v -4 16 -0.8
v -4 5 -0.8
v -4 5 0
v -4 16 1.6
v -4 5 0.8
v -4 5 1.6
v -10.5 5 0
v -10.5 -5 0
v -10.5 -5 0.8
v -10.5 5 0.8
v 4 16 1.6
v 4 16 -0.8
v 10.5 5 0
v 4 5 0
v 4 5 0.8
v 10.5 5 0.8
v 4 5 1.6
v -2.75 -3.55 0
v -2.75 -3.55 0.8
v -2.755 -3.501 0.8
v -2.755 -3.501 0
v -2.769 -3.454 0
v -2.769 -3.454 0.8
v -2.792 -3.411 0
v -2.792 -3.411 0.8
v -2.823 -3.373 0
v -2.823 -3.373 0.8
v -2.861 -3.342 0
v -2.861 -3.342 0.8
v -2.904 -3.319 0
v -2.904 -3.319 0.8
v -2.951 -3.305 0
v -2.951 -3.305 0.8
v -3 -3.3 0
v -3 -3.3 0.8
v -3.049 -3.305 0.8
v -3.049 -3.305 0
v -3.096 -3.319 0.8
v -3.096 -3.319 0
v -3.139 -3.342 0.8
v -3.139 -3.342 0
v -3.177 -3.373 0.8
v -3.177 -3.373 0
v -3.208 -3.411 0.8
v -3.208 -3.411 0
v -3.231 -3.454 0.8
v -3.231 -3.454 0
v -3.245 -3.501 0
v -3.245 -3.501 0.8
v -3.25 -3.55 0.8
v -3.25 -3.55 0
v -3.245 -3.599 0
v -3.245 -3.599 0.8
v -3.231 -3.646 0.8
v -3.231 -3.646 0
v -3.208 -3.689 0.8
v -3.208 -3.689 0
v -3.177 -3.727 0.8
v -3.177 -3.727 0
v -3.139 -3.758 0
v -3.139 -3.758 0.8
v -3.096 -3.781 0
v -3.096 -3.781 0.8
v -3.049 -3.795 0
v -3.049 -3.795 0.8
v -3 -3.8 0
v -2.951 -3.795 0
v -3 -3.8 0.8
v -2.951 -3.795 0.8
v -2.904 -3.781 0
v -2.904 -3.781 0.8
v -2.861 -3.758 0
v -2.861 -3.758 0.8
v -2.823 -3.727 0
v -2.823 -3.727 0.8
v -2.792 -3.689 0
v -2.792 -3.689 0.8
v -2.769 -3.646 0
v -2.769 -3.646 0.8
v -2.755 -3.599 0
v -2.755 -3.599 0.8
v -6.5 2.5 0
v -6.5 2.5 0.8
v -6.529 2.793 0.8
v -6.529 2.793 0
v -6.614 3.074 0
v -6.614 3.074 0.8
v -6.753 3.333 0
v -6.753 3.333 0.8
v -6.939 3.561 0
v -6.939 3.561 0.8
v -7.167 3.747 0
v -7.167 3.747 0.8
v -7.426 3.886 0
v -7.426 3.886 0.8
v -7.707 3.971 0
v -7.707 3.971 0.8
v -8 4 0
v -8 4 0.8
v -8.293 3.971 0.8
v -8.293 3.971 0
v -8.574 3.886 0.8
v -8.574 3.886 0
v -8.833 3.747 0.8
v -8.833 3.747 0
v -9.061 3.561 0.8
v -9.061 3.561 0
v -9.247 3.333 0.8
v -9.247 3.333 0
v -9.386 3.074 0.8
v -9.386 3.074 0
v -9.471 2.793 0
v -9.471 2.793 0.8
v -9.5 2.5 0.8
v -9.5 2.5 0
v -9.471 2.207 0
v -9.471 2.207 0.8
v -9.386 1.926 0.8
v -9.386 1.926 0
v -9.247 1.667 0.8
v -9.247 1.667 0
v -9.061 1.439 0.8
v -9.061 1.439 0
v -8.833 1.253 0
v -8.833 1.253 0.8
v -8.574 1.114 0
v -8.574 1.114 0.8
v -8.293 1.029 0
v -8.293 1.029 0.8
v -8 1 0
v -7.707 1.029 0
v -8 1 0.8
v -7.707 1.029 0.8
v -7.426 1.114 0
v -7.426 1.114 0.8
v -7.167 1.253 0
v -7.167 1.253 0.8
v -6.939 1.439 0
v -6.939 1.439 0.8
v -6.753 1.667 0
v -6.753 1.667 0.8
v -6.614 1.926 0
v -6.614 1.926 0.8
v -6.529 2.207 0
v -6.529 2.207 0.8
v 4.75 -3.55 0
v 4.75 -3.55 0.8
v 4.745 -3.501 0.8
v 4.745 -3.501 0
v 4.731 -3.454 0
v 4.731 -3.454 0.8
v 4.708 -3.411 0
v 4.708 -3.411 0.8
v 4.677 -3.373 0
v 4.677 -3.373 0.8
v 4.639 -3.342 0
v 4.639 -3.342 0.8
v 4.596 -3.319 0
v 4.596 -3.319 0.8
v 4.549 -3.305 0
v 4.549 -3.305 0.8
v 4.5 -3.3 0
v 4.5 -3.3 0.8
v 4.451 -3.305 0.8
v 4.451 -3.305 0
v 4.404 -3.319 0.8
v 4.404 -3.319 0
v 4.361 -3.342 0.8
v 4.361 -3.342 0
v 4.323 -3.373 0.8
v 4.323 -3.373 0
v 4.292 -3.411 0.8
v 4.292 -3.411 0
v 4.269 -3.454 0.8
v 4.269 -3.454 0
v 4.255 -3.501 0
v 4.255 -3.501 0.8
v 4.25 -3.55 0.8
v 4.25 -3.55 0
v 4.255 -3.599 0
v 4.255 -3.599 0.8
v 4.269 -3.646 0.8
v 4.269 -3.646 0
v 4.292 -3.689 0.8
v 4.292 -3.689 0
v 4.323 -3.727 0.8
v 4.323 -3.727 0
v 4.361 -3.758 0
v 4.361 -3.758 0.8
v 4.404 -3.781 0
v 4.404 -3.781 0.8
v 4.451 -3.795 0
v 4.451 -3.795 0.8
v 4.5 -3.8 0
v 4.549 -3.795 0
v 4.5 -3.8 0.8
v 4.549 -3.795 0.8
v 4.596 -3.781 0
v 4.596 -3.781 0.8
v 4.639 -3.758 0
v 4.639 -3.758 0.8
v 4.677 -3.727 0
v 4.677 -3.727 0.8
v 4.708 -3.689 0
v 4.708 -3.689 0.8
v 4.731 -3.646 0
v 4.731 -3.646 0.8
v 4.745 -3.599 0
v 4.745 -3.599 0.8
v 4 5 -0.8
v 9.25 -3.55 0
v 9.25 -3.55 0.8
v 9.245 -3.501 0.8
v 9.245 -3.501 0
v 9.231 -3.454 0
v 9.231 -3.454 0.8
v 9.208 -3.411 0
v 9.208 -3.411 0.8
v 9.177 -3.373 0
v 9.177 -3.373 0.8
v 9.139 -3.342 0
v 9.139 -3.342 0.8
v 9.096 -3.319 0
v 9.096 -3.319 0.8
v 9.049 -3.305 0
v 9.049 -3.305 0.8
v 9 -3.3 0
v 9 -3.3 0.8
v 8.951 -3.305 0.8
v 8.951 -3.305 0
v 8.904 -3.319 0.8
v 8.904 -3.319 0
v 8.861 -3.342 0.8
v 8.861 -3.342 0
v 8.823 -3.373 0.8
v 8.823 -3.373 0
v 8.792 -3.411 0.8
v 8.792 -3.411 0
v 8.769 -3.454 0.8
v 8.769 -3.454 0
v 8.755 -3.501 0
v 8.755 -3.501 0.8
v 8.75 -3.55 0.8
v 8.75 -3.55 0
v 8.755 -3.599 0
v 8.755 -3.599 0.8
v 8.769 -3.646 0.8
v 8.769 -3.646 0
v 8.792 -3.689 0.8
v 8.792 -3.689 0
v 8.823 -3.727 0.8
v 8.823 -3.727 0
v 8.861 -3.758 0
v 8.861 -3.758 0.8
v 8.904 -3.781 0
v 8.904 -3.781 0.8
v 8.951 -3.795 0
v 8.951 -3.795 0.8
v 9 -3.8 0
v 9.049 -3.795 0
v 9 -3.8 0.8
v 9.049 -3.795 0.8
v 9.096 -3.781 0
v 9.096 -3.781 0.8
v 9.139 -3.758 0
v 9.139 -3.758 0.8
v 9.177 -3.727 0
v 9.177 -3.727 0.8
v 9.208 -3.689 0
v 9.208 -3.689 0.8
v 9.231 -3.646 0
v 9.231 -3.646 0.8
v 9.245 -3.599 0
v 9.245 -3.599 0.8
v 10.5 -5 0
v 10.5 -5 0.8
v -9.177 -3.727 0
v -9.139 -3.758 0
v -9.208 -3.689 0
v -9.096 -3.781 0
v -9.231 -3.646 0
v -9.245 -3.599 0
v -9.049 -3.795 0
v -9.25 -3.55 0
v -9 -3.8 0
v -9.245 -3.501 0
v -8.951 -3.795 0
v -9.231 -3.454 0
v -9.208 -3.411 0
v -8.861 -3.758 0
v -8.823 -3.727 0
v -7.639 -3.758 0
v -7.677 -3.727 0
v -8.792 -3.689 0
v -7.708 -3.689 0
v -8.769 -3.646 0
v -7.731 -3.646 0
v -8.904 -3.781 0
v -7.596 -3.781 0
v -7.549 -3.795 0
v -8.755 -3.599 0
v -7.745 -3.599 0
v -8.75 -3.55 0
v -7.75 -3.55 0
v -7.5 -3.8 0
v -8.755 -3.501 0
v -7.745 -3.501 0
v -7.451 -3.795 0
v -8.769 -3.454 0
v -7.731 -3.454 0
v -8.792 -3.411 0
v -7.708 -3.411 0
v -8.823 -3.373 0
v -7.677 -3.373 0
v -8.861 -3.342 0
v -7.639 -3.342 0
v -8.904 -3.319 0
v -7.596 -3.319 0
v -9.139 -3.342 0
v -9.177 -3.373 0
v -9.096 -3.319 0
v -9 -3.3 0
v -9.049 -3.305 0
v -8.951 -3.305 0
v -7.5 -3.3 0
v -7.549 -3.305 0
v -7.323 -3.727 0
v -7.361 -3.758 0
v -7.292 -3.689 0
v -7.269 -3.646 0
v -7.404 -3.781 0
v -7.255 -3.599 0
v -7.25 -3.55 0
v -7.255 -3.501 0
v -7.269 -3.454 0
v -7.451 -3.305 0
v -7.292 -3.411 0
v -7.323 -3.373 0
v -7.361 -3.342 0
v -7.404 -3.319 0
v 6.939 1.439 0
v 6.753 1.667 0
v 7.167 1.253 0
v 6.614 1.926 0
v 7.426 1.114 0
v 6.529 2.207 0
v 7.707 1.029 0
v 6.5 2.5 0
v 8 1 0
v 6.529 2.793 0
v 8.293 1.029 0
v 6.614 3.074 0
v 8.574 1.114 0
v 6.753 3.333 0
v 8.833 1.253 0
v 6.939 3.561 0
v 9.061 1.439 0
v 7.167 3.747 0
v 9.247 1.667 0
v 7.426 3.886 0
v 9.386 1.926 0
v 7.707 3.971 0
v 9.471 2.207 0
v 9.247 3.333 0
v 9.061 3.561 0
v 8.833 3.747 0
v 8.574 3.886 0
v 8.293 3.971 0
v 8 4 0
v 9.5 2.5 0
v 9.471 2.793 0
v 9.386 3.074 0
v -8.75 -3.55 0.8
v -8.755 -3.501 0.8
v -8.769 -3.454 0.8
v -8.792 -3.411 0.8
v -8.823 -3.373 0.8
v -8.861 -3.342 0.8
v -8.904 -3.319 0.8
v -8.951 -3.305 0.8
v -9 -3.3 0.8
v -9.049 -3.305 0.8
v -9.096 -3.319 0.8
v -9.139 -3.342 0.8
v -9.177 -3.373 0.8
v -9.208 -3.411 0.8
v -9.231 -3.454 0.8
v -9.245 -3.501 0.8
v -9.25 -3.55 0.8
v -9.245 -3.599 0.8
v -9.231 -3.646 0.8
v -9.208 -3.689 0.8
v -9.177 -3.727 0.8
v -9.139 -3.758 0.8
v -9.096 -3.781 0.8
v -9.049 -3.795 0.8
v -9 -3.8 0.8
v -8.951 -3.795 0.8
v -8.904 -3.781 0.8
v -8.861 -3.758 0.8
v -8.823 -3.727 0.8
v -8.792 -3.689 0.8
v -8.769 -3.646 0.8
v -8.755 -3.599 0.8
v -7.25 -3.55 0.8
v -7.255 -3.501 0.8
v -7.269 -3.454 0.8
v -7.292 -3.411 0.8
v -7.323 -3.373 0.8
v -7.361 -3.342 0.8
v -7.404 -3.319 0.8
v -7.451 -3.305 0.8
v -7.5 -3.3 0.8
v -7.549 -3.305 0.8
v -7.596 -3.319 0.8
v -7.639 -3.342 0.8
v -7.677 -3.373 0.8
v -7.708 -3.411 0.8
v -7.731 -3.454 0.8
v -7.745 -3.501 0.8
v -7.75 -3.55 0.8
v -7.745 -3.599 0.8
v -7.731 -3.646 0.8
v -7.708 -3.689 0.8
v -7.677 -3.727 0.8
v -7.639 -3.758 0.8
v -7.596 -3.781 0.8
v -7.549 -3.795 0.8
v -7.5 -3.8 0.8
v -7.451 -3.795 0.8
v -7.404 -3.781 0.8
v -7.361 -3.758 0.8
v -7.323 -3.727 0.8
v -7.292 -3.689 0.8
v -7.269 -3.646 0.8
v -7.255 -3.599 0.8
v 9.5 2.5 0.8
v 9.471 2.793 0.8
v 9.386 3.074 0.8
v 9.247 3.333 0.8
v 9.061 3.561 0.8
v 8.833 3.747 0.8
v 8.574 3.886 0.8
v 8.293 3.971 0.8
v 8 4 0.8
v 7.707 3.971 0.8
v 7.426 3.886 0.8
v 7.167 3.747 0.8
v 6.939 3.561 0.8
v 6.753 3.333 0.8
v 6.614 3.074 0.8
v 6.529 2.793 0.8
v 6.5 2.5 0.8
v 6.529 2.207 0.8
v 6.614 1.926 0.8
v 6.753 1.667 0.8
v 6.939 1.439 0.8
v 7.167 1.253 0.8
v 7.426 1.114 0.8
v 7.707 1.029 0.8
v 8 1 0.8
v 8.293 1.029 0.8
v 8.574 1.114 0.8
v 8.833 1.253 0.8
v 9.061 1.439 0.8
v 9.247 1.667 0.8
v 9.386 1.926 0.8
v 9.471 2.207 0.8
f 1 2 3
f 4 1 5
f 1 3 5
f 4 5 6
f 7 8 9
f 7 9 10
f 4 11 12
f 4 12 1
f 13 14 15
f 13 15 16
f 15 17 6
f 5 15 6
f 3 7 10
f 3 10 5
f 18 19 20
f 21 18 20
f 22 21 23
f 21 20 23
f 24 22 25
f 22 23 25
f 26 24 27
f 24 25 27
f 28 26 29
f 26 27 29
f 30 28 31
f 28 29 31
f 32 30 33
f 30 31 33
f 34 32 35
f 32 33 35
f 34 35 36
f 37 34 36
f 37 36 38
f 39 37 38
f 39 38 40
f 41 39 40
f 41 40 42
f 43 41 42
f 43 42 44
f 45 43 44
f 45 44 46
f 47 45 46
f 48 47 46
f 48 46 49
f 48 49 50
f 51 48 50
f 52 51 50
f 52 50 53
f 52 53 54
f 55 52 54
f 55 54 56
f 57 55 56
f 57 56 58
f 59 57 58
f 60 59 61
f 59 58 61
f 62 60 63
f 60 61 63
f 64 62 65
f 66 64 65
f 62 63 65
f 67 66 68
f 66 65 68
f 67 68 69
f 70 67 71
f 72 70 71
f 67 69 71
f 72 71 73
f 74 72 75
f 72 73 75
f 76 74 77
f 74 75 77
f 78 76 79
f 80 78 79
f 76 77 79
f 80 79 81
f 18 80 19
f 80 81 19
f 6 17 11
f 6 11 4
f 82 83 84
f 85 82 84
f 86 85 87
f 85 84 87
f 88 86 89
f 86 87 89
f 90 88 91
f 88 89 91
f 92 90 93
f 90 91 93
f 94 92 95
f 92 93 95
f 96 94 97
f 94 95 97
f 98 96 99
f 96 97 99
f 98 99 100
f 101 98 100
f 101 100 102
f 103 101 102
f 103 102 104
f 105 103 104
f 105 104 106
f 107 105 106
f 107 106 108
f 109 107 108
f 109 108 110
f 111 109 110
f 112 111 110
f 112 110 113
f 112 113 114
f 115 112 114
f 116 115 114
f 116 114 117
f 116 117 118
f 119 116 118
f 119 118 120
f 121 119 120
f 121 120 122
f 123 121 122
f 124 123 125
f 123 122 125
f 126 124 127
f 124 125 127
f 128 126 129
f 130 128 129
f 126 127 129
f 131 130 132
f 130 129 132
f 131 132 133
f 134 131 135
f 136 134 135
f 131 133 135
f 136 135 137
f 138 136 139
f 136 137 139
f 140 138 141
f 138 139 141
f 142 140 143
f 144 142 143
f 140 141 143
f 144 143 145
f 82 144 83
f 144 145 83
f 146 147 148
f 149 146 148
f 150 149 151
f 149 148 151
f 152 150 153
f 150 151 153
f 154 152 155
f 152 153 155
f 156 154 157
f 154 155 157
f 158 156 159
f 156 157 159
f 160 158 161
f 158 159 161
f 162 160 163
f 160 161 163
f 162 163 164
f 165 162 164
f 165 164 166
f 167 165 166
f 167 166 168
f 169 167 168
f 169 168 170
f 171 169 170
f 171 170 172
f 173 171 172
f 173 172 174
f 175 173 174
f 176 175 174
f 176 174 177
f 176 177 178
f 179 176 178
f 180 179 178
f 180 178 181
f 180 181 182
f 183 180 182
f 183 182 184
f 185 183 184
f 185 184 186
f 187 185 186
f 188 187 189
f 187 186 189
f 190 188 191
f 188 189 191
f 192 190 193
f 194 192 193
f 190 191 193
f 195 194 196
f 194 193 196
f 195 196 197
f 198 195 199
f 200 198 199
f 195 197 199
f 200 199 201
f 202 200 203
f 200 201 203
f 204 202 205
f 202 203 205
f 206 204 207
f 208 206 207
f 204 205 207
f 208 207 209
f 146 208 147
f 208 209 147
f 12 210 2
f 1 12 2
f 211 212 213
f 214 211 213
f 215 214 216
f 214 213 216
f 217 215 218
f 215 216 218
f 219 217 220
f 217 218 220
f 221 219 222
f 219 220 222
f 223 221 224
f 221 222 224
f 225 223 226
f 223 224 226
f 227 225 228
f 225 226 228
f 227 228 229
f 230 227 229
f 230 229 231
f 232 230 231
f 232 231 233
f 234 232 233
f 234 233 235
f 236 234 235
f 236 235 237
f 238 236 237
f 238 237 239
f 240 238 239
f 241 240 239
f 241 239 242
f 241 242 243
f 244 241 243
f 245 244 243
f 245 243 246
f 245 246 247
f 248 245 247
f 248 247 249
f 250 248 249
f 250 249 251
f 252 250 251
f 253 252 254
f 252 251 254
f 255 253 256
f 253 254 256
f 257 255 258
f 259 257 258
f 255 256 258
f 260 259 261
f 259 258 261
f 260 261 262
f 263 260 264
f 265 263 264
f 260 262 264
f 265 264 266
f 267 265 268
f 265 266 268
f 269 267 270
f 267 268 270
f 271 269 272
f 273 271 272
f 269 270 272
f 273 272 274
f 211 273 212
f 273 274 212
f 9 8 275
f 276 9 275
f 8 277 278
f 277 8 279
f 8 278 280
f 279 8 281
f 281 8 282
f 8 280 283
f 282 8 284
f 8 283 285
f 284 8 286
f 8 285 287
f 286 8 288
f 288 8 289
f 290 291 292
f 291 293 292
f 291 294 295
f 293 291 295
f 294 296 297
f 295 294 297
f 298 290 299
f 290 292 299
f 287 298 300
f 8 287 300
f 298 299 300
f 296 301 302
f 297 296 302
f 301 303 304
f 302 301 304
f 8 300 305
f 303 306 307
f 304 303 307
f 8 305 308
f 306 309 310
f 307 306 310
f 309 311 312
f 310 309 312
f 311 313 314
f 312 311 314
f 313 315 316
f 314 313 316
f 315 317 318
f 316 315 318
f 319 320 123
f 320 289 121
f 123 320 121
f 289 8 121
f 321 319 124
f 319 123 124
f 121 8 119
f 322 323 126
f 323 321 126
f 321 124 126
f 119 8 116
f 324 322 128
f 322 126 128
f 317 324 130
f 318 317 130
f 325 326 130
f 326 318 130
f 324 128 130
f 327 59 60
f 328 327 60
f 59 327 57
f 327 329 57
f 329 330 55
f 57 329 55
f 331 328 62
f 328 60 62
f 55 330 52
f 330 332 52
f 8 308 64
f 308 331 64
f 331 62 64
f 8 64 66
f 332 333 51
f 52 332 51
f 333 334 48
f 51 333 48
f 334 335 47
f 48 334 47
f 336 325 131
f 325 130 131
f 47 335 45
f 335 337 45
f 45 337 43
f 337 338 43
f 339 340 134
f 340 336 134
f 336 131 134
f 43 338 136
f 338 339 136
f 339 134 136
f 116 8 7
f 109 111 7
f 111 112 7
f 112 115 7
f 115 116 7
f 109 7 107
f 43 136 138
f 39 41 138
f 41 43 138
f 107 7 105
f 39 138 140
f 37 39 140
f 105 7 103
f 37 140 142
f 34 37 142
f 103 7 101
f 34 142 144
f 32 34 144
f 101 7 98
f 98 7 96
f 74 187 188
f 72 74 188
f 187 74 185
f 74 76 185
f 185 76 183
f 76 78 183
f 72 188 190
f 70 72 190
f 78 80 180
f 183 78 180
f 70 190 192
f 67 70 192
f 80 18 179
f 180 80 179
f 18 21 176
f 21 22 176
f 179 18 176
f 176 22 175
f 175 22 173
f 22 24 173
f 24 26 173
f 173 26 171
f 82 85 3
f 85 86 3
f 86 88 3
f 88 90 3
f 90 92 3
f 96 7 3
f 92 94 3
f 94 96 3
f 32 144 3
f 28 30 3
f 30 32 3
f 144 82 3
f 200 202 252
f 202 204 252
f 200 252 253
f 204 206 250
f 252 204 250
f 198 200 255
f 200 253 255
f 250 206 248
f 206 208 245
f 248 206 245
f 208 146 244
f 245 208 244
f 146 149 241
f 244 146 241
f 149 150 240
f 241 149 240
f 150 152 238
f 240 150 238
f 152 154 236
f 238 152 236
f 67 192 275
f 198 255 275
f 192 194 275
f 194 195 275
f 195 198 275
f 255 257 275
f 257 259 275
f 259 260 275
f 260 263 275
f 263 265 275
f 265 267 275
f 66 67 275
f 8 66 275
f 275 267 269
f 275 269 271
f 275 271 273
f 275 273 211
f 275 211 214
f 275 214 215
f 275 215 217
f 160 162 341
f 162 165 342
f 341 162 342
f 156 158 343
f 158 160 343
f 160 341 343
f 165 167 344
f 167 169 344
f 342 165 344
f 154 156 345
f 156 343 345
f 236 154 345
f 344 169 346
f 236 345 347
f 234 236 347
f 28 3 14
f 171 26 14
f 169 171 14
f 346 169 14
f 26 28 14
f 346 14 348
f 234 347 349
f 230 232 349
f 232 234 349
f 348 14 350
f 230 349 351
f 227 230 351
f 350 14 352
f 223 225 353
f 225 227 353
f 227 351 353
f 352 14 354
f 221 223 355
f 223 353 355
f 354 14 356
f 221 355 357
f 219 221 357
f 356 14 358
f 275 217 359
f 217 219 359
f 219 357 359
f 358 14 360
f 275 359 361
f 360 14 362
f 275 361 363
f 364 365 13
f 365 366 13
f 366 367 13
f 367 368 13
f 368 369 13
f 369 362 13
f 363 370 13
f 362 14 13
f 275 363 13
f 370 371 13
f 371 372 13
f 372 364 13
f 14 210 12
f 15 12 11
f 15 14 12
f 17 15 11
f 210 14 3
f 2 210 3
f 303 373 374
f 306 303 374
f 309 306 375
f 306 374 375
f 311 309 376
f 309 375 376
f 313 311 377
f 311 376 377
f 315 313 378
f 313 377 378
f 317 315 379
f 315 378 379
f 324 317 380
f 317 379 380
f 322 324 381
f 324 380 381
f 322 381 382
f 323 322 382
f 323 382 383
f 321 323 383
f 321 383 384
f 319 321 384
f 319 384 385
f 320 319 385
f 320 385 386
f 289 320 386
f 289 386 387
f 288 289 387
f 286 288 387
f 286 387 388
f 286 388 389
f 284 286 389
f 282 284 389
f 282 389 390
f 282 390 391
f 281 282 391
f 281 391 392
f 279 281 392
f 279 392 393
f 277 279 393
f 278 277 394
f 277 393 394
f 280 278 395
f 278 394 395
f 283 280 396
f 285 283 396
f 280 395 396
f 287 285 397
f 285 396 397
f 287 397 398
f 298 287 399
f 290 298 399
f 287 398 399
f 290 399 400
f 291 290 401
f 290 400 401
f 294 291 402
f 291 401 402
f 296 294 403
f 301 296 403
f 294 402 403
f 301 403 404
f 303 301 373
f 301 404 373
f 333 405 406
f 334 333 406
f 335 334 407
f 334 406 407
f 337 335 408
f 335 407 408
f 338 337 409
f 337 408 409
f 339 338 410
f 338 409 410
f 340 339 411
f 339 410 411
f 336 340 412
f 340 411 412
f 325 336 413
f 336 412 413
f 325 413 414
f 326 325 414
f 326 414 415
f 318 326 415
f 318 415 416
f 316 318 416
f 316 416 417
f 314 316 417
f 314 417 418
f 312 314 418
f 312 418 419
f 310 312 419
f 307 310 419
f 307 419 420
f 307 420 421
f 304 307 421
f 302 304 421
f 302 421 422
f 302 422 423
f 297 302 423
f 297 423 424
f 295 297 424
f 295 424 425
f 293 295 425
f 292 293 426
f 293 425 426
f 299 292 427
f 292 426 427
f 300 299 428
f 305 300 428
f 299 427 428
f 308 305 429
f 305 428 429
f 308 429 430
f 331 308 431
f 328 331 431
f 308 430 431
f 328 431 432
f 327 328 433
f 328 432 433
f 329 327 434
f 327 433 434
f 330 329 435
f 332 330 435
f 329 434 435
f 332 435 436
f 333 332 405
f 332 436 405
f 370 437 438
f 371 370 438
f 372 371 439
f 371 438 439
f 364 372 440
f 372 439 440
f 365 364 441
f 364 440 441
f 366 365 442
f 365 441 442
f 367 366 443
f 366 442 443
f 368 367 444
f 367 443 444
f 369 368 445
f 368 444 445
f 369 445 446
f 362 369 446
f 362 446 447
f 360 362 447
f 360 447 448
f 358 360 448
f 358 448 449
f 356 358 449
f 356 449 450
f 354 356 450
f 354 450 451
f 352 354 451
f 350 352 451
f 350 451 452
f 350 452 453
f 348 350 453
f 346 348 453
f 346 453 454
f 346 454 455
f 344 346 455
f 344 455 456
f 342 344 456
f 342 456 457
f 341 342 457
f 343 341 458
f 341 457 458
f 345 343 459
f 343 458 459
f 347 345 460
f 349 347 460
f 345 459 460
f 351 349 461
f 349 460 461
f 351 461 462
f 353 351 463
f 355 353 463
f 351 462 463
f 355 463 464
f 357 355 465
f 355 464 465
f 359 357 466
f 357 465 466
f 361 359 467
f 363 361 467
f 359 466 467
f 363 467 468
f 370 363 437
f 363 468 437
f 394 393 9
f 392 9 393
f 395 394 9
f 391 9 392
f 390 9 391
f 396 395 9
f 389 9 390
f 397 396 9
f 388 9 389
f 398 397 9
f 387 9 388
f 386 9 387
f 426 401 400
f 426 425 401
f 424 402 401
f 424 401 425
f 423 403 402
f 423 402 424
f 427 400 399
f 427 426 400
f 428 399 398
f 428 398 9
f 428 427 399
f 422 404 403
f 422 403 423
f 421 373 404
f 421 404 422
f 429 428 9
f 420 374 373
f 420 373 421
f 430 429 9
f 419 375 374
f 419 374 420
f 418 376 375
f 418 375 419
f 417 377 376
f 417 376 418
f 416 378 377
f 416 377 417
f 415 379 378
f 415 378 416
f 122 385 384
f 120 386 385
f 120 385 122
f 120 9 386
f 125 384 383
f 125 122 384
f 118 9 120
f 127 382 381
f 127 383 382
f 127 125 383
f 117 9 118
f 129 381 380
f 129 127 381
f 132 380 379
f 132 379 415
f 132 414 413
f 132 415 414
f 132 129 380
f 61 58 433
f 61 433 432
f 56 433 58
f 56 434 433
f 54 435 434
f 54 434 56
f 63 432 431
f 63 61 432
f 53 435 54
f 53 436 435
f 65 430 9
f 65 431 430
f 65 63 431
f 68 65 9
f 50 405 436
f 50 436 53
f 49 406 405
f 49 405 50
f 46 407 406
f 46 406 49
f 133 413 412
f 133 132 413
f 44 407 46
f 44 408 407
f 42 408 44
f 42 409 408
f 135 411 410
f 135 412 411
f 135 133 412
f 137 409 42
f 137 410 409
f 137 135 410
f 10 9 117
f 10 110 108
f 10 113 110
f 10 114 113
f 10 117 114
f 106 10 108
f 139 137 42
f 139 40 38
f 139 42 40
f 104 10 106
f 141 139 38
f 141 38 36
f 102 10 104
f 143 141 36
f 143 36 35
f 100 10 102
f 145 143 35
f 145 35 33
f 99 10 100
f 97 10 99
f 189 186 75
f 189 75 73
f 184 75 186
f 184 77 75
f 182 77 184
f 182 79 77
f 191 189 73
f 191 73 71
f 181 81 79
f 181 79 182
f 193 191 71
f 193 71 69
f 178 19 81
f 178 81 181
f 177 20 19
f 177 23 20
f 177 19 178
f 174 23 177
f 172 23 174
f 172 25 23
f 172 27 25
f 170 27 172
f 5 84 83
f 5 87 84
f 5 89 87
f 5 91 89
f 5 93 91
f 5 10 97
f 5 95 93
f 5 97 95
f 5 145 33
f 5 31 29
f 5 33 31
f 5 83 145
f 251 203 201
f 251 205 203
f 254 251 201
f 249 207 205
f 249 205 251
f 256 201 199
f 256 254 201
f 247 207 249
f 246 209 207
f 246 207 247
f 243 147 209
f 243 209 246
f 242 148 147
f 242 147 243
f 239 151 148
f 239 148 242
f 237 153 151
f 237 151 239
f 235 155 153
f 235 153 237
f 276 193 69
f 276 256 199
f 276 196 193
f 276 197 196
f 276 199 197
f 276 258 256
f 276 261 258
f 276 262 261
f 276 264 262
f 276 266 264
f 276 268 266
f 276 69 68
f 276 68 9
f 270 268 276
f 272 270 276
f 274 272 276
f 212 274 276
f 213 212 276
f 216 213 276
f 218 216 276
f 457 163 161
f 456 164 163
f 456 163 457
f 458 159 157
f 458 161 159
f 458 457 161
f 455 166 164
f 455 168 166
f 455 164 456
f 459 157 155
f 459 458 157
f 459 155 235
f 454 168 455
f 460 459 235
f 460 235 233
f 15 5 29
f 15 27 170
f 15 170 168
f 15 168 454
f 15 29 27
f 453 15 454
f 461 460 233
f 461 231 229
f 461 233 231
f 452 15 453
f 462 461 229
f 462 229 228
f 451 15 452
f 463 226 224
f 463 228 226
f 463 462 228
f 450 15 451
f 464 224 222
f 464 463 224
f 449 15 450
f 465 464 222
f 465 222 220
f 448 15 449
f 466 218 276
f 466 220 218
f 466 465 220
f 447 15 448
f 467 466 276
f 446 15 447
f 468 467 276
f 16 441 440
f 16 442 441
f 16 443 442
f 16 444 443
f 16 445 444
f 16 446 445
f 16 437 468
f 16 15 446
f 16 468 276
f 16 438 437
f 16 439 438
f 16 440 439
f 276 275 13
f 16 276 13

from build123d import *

# Parameters (mm, degrees)
SKETCH_W     = 21
SKETCH_H     = 10
PAD_DEPTH    = 0.8
SKETCH001_W  = 8
SKETCH001_H  = 1.2
PAD001_DEPTH = 11
SKETCH002_W  = 8
SKETCH002_H  = 1.2
PAD002_DEPTH = 11
SKETCH003_R  = 0.25
POCKET_DEPTH = 3
SKETCH004_R  = 1.5
HOLE_DEPTH   = 1.601


with BuildPart() as part:
    # Sketch → Pad (new body)
    with BuildSketch(Plane.XY):
        Rectangle(SKETCH_W, SKETCH_H)
    extrude(amount=PAD_DEPTH)

    # Sketch001 (on Face1 of Pad) → Pad001 (join)
    with BuildSketch(Plane(origin=(0, 5, 0), x_dir=(-1, 0, 0), z_dir=(0, 1, 0))):
        with Locations((0, -0.2)):
            Rectangle(SKETCH001_W, SKETCH001_H)
    extrude(amount=PAD001_DEPTH)

    # Sketch002 (on Face1 of Pad001) → Pad002 (join)
    with BuildSketch(Plane(origin=(0, 5, 0), x_dir=(-1, 0, 0), z_dir=(0, 1, 0))):
        with Locations((0, 1)):
            Rectangle(SKETCH002_W, SKETCH002_H)
    extrude(amount=PAD002_DEPTH)

    # Sketch003 (on Face5 of Pad002) → Pocket (cut)
    with BuildSketch(Plane.XY.offset(0.8)):
        with Locations((-9, -3.55)):
            Circle(SKETCH003_R)
        with Locations((-7.5, -3.55)):
            Circle(SKETCH003_R)
        with Locations((-3, -3.55)):
            Circle(SKETCH003_R)
        with Locations((4.5, -3.55)):
            Circle(SKETCH003_R)
        with Locations((9, -3.55)):
            Circle(SKETCH003_R)
    extrude(amount=-POCKET_DEPTH, mode=Mode.SUBTRACT)

    # Sketch004 (on Face5 of Pocket) → Hole (cut, through all)
    with BuildSketch(Plane.XY.offset(0.8)):
        with Locations((-8, 2.5)):
            Circle(SKETCH004_R)
        with Locations((8, 2.5)):
            Circle(SKETCH004_R)
    extrude(amount=-HOLE_DEPTH, mode=Mode.SUBTRACT)


solid = part.part
